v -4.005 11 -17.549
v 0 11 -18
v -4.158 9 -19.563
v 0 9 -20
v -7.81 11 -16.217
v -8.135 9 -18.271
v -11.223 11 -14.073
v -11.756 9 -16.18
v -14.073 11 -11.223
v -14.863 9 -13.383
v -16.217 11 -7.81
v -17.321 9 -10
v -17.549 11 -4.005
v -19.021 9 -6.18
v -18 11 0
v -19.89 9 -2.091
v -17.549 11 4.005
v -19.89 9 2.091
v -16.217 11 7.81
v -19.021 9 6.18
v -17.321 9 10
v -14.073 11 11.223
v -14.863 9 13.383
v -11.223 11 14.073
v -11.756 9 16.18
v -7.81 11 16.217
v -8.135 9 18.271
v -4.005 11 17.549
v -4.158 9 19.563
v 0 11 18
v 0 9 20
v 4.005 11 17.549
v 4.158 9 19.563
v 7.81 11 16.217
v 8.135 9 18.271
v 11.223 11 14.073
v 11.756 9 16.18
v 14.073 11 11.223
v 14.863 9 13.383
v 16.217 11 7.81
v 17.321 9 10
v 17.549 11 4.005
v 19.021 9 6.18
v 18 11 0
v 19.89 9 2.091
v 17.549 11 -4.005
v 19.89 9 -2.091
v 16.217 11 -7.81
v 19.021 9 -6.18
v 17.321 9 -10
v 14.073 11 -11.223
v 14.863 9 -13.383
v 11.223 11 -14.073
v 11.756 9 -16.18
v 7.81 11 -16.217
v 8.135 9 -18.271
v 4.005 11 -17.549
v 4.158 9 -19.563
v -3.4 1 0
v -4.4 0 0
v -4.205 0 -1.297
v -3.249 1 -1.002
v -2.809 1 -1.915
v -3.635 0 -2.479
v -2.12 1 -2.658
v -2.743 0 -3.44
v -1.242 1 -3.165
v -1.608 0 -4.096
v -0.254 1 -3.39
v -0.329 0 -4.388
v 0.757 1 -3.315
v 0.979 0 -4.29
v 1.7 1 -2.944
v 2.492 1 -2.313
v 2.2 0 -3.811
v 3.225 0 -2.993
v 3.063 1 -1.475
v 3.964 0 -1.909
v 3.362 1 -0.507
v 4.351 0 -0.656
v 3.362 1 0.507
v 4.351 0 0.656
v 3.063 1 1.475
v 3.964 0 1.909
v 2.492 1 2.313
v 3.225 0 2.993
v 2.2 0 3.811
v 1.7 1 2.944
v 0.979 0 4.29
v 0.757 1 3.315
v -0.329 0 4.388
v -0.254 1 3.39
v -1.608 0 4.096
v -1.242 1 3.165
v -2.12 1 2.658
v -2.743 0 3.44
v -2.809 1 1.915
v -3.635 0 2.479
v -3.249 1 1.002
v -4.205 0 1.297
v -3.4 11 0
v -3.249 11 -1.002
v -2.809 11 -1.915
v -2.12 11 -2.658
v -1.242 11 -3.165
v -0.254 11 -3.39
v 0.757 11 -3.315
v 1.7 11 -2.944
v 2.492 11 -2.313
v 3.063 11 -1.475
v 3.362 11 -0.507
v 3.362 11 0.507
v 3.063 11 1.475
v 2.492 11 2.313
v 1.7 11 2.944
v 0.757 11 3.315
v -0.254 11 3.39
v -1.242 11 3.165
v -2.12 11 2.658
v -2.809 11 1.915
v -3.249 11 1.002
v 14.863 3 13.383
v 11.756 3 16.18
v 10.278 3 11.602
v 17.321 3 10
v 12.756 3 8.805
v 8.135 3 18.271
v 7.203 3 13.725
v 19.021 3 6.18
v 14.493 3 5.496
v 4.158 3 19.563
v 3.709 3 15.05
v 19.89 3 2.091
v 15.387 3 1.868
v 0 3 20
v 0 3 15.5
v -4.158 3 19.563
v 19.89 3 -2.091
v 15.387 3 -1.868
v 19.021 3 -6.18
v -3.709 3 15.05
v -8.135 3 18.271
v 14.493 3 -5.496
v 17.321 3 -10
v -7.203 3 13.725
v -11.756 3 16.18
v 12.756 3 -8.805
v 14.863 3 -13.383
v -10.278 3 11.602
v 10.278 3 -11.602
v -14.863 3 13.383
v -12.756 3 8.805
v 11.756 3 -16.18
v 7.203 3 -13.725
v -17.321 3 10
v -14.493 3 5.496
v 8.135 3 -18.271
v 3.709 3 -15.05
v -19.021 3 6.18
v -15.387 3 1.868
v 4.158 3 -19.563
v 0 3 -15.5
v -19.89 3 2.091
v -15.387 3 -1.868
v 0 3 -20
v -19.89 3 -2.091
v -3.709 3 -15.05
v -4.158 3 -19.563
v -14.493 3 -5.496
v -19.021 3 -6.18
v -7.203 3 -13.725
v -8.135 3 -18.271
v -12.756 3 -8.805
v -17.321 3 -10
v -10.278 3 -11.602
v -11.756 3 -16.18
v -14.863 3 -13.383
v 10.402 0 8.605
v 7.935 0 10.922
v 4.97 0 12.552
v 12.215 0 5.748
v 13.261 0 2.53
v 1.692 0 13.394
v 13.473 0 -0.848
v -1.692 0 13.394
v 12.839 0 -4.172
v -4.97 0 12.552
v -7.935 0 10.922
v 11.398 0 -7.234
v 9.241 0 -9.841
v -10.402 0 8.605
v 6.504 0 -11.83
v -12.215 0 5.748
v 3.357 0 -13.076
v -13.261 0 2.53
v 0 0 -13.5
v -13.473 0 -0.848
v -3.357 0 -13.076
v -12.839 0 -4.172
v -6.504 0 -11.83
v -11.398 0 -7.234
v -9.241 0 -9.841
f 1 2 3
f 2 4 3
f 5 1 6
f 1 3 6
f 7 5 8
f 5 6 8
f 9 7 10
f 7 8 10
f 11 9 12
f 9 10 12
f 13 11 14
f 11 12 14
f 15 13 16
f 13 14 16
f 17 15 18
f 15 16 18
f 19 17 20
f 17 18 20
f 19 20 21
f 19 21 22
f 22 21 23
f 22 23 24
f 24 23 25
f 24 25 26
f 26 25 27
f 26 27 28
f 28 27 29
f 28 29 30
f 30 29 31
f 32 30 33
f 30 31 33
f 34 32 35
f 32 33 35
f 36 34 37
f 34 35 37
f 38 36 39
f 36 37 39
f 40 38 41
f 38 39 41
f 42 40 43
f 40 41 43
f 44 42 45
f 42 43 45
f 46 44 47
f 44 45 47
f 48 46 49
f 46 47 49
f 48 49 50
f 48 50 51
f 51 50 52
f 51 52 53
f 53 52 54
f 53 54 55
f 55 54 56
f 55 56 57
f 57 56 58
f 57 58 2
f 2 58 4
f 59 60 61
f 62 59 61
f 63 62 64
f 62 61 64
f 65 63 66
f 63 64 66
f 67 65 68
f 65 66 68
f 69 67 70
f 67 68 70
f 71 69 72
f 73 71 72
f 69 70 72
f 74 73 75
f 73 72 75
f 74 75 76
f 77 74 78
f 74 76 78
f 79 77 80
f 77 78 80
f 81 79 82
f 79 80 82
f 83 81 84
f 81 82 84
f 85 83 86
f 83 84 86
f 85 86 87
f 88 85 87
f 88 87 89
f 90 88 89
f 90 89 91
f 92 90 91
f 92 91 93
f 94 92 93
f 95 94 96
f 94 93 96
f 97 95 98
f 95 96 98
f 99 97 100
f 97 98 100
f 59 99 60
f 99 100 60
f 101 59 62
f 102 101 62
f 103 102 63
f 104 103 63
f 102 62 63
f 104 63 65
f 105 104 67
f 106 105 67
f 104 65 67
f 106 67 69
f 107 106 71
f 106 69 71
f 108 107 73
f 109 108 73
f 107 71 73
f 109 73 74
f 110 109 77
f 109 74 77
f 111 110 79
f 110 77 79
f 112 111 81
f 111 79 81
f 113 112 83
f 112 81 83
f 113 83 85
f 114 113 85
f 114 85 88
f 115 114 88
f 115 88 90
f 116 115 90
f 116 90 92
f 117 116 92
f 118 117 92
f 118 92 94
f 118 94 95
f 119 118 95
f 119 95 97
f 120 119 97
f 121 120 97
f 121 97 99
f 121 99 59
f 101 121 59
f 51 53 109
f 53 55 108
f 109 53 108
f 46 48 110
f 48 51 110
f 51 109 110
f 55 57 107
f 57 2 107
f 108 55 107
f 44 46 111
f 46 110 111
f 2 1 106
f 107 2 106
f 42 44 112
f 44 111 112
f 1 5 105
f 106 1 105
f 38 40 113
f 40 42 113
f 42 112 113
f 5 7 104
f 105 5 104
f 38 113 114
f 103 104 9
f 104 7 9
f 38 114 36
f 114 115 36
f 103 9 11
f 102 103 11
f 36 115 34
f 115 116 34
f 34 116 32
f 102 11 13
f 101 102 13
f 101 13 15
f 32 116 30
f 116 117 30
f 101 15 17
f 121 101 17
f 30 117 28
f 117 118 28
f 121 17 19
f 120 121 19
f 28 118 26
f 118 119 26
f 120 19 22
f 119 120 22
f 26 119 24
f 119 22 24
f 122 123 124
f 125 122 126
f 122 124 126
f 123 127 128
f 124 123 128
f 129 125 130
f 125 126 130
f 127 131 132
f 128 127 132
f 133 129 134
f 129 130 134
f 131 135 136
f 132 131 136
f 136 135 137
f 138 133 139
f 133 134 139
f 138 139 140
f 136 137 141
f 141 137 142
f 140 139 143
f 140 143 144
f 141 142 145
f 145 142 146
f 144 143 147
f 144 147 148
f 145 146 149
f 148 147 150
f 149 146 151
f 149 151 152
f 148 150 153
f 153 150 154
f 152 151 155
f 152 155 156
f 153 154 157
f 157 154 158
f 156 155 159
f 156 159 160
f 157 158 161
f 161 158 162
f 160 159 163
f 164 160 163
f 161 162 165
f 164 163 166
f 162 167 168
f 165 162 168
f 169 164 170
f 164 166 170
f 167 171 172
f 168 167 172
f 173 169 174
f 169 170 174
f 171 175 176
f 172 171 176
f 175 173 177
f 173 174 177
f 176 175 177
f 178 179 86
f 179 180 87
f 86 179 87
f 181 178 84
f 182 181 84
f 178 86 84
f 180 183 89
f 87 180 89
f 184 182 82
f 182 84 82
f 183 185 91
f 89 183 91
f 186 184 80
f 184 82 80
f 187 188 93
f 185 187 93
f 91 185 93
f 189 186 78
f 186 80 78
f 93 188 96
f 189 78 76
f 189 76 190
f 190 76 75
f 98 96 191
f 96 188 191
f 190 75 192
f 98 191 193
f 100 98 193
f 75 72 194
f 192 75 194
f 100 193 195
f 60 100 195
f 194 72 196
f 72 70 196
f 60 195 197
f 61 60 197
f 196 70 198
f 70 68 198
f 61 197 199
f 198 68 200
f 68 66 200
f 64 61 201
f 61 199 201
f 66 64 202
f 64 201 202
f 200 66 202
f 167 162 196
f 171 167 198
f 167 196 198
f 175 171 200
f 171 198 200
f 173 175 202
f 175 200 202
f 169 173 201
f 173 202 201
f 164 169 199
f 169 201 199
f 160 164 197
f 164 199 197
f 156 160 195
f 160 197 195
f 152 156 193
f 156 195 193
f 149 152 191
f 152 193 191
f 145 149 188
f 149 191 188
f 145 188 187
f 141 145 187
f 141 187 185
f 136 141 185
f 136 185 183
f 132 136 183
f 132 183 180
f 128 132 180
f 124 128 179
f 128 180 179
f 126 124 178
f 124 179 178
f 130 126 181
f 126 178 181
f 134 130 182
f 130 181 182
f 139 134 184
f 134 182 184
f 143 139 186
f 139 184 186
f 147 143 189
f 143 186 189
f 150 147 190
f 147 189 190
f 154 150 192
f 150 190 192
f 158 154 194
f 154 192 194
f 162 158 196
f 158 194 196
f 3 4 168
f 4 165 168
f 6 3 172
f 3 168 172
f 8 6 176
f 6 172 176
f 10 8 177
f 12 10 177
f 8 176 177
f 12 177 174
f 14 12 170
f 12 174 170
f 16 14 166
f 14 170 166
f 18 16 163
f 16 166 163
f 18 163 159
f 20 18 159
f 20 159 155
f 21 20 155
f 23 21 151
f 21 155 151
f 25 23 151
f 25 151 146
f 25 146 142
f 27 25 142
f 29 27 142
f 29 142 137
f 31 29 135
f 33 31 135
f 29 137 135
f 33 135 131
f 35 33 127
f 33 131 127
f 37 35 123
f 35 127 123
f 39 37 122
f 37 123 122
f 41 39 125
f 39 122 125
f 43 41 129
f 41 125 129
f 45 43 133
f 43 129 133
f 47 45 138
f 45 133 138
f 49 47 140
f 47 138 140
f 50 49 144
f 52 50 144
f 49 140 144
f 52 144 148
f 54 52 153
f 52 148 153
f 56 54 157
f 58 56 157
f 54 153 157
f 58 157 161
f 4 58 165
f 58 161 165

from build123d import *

# Parameters (mm, degrees)
M8_TAPPED_HOLE1_D     = 6.8
M8_TAPPED_HOLE1_DEPTH = 21.25
CHAMFER1_SIZE         = 1


with BuildPart() as part:
    # Sketch1 → Revolve1 (revolve)
    with BuildSketch(Plane.XY, mode=Mode.PRIVATE) as revolve1_sk:
        Polygon((0, 0), (0, 11), (18, 11), (20, 9), (20, 3), (15.5, 3), (13.5, 0), align=None)
    revolve(revolve1_sk.sketch.rotate(Axis((0, 0, 0), (0, 1, 0)), 90), axis=Axis((0, 0, 0), (0, 1, 0)))

    # M8 Tapped Hole1
    with Locations(Plane(origin=(0, 11, 0), x_dir=(1, 0, 0), z_dir=(0, 1, 0))):
        with Locations((0, 0)):
            Hole(M8_TAPPED_HOLE1_D / 2, depth=M8_TAPPED_HOLE1_DEPTH)

    # Chamfer1
    chamfer1_edges = [part.edges().sort_by_distance(p)[0] for p in [
        (3.4, 0, 0),
    ]]
    chamfer(chamfer1_edges, length=CHAMFER1_SIZE)


solid = part.part
